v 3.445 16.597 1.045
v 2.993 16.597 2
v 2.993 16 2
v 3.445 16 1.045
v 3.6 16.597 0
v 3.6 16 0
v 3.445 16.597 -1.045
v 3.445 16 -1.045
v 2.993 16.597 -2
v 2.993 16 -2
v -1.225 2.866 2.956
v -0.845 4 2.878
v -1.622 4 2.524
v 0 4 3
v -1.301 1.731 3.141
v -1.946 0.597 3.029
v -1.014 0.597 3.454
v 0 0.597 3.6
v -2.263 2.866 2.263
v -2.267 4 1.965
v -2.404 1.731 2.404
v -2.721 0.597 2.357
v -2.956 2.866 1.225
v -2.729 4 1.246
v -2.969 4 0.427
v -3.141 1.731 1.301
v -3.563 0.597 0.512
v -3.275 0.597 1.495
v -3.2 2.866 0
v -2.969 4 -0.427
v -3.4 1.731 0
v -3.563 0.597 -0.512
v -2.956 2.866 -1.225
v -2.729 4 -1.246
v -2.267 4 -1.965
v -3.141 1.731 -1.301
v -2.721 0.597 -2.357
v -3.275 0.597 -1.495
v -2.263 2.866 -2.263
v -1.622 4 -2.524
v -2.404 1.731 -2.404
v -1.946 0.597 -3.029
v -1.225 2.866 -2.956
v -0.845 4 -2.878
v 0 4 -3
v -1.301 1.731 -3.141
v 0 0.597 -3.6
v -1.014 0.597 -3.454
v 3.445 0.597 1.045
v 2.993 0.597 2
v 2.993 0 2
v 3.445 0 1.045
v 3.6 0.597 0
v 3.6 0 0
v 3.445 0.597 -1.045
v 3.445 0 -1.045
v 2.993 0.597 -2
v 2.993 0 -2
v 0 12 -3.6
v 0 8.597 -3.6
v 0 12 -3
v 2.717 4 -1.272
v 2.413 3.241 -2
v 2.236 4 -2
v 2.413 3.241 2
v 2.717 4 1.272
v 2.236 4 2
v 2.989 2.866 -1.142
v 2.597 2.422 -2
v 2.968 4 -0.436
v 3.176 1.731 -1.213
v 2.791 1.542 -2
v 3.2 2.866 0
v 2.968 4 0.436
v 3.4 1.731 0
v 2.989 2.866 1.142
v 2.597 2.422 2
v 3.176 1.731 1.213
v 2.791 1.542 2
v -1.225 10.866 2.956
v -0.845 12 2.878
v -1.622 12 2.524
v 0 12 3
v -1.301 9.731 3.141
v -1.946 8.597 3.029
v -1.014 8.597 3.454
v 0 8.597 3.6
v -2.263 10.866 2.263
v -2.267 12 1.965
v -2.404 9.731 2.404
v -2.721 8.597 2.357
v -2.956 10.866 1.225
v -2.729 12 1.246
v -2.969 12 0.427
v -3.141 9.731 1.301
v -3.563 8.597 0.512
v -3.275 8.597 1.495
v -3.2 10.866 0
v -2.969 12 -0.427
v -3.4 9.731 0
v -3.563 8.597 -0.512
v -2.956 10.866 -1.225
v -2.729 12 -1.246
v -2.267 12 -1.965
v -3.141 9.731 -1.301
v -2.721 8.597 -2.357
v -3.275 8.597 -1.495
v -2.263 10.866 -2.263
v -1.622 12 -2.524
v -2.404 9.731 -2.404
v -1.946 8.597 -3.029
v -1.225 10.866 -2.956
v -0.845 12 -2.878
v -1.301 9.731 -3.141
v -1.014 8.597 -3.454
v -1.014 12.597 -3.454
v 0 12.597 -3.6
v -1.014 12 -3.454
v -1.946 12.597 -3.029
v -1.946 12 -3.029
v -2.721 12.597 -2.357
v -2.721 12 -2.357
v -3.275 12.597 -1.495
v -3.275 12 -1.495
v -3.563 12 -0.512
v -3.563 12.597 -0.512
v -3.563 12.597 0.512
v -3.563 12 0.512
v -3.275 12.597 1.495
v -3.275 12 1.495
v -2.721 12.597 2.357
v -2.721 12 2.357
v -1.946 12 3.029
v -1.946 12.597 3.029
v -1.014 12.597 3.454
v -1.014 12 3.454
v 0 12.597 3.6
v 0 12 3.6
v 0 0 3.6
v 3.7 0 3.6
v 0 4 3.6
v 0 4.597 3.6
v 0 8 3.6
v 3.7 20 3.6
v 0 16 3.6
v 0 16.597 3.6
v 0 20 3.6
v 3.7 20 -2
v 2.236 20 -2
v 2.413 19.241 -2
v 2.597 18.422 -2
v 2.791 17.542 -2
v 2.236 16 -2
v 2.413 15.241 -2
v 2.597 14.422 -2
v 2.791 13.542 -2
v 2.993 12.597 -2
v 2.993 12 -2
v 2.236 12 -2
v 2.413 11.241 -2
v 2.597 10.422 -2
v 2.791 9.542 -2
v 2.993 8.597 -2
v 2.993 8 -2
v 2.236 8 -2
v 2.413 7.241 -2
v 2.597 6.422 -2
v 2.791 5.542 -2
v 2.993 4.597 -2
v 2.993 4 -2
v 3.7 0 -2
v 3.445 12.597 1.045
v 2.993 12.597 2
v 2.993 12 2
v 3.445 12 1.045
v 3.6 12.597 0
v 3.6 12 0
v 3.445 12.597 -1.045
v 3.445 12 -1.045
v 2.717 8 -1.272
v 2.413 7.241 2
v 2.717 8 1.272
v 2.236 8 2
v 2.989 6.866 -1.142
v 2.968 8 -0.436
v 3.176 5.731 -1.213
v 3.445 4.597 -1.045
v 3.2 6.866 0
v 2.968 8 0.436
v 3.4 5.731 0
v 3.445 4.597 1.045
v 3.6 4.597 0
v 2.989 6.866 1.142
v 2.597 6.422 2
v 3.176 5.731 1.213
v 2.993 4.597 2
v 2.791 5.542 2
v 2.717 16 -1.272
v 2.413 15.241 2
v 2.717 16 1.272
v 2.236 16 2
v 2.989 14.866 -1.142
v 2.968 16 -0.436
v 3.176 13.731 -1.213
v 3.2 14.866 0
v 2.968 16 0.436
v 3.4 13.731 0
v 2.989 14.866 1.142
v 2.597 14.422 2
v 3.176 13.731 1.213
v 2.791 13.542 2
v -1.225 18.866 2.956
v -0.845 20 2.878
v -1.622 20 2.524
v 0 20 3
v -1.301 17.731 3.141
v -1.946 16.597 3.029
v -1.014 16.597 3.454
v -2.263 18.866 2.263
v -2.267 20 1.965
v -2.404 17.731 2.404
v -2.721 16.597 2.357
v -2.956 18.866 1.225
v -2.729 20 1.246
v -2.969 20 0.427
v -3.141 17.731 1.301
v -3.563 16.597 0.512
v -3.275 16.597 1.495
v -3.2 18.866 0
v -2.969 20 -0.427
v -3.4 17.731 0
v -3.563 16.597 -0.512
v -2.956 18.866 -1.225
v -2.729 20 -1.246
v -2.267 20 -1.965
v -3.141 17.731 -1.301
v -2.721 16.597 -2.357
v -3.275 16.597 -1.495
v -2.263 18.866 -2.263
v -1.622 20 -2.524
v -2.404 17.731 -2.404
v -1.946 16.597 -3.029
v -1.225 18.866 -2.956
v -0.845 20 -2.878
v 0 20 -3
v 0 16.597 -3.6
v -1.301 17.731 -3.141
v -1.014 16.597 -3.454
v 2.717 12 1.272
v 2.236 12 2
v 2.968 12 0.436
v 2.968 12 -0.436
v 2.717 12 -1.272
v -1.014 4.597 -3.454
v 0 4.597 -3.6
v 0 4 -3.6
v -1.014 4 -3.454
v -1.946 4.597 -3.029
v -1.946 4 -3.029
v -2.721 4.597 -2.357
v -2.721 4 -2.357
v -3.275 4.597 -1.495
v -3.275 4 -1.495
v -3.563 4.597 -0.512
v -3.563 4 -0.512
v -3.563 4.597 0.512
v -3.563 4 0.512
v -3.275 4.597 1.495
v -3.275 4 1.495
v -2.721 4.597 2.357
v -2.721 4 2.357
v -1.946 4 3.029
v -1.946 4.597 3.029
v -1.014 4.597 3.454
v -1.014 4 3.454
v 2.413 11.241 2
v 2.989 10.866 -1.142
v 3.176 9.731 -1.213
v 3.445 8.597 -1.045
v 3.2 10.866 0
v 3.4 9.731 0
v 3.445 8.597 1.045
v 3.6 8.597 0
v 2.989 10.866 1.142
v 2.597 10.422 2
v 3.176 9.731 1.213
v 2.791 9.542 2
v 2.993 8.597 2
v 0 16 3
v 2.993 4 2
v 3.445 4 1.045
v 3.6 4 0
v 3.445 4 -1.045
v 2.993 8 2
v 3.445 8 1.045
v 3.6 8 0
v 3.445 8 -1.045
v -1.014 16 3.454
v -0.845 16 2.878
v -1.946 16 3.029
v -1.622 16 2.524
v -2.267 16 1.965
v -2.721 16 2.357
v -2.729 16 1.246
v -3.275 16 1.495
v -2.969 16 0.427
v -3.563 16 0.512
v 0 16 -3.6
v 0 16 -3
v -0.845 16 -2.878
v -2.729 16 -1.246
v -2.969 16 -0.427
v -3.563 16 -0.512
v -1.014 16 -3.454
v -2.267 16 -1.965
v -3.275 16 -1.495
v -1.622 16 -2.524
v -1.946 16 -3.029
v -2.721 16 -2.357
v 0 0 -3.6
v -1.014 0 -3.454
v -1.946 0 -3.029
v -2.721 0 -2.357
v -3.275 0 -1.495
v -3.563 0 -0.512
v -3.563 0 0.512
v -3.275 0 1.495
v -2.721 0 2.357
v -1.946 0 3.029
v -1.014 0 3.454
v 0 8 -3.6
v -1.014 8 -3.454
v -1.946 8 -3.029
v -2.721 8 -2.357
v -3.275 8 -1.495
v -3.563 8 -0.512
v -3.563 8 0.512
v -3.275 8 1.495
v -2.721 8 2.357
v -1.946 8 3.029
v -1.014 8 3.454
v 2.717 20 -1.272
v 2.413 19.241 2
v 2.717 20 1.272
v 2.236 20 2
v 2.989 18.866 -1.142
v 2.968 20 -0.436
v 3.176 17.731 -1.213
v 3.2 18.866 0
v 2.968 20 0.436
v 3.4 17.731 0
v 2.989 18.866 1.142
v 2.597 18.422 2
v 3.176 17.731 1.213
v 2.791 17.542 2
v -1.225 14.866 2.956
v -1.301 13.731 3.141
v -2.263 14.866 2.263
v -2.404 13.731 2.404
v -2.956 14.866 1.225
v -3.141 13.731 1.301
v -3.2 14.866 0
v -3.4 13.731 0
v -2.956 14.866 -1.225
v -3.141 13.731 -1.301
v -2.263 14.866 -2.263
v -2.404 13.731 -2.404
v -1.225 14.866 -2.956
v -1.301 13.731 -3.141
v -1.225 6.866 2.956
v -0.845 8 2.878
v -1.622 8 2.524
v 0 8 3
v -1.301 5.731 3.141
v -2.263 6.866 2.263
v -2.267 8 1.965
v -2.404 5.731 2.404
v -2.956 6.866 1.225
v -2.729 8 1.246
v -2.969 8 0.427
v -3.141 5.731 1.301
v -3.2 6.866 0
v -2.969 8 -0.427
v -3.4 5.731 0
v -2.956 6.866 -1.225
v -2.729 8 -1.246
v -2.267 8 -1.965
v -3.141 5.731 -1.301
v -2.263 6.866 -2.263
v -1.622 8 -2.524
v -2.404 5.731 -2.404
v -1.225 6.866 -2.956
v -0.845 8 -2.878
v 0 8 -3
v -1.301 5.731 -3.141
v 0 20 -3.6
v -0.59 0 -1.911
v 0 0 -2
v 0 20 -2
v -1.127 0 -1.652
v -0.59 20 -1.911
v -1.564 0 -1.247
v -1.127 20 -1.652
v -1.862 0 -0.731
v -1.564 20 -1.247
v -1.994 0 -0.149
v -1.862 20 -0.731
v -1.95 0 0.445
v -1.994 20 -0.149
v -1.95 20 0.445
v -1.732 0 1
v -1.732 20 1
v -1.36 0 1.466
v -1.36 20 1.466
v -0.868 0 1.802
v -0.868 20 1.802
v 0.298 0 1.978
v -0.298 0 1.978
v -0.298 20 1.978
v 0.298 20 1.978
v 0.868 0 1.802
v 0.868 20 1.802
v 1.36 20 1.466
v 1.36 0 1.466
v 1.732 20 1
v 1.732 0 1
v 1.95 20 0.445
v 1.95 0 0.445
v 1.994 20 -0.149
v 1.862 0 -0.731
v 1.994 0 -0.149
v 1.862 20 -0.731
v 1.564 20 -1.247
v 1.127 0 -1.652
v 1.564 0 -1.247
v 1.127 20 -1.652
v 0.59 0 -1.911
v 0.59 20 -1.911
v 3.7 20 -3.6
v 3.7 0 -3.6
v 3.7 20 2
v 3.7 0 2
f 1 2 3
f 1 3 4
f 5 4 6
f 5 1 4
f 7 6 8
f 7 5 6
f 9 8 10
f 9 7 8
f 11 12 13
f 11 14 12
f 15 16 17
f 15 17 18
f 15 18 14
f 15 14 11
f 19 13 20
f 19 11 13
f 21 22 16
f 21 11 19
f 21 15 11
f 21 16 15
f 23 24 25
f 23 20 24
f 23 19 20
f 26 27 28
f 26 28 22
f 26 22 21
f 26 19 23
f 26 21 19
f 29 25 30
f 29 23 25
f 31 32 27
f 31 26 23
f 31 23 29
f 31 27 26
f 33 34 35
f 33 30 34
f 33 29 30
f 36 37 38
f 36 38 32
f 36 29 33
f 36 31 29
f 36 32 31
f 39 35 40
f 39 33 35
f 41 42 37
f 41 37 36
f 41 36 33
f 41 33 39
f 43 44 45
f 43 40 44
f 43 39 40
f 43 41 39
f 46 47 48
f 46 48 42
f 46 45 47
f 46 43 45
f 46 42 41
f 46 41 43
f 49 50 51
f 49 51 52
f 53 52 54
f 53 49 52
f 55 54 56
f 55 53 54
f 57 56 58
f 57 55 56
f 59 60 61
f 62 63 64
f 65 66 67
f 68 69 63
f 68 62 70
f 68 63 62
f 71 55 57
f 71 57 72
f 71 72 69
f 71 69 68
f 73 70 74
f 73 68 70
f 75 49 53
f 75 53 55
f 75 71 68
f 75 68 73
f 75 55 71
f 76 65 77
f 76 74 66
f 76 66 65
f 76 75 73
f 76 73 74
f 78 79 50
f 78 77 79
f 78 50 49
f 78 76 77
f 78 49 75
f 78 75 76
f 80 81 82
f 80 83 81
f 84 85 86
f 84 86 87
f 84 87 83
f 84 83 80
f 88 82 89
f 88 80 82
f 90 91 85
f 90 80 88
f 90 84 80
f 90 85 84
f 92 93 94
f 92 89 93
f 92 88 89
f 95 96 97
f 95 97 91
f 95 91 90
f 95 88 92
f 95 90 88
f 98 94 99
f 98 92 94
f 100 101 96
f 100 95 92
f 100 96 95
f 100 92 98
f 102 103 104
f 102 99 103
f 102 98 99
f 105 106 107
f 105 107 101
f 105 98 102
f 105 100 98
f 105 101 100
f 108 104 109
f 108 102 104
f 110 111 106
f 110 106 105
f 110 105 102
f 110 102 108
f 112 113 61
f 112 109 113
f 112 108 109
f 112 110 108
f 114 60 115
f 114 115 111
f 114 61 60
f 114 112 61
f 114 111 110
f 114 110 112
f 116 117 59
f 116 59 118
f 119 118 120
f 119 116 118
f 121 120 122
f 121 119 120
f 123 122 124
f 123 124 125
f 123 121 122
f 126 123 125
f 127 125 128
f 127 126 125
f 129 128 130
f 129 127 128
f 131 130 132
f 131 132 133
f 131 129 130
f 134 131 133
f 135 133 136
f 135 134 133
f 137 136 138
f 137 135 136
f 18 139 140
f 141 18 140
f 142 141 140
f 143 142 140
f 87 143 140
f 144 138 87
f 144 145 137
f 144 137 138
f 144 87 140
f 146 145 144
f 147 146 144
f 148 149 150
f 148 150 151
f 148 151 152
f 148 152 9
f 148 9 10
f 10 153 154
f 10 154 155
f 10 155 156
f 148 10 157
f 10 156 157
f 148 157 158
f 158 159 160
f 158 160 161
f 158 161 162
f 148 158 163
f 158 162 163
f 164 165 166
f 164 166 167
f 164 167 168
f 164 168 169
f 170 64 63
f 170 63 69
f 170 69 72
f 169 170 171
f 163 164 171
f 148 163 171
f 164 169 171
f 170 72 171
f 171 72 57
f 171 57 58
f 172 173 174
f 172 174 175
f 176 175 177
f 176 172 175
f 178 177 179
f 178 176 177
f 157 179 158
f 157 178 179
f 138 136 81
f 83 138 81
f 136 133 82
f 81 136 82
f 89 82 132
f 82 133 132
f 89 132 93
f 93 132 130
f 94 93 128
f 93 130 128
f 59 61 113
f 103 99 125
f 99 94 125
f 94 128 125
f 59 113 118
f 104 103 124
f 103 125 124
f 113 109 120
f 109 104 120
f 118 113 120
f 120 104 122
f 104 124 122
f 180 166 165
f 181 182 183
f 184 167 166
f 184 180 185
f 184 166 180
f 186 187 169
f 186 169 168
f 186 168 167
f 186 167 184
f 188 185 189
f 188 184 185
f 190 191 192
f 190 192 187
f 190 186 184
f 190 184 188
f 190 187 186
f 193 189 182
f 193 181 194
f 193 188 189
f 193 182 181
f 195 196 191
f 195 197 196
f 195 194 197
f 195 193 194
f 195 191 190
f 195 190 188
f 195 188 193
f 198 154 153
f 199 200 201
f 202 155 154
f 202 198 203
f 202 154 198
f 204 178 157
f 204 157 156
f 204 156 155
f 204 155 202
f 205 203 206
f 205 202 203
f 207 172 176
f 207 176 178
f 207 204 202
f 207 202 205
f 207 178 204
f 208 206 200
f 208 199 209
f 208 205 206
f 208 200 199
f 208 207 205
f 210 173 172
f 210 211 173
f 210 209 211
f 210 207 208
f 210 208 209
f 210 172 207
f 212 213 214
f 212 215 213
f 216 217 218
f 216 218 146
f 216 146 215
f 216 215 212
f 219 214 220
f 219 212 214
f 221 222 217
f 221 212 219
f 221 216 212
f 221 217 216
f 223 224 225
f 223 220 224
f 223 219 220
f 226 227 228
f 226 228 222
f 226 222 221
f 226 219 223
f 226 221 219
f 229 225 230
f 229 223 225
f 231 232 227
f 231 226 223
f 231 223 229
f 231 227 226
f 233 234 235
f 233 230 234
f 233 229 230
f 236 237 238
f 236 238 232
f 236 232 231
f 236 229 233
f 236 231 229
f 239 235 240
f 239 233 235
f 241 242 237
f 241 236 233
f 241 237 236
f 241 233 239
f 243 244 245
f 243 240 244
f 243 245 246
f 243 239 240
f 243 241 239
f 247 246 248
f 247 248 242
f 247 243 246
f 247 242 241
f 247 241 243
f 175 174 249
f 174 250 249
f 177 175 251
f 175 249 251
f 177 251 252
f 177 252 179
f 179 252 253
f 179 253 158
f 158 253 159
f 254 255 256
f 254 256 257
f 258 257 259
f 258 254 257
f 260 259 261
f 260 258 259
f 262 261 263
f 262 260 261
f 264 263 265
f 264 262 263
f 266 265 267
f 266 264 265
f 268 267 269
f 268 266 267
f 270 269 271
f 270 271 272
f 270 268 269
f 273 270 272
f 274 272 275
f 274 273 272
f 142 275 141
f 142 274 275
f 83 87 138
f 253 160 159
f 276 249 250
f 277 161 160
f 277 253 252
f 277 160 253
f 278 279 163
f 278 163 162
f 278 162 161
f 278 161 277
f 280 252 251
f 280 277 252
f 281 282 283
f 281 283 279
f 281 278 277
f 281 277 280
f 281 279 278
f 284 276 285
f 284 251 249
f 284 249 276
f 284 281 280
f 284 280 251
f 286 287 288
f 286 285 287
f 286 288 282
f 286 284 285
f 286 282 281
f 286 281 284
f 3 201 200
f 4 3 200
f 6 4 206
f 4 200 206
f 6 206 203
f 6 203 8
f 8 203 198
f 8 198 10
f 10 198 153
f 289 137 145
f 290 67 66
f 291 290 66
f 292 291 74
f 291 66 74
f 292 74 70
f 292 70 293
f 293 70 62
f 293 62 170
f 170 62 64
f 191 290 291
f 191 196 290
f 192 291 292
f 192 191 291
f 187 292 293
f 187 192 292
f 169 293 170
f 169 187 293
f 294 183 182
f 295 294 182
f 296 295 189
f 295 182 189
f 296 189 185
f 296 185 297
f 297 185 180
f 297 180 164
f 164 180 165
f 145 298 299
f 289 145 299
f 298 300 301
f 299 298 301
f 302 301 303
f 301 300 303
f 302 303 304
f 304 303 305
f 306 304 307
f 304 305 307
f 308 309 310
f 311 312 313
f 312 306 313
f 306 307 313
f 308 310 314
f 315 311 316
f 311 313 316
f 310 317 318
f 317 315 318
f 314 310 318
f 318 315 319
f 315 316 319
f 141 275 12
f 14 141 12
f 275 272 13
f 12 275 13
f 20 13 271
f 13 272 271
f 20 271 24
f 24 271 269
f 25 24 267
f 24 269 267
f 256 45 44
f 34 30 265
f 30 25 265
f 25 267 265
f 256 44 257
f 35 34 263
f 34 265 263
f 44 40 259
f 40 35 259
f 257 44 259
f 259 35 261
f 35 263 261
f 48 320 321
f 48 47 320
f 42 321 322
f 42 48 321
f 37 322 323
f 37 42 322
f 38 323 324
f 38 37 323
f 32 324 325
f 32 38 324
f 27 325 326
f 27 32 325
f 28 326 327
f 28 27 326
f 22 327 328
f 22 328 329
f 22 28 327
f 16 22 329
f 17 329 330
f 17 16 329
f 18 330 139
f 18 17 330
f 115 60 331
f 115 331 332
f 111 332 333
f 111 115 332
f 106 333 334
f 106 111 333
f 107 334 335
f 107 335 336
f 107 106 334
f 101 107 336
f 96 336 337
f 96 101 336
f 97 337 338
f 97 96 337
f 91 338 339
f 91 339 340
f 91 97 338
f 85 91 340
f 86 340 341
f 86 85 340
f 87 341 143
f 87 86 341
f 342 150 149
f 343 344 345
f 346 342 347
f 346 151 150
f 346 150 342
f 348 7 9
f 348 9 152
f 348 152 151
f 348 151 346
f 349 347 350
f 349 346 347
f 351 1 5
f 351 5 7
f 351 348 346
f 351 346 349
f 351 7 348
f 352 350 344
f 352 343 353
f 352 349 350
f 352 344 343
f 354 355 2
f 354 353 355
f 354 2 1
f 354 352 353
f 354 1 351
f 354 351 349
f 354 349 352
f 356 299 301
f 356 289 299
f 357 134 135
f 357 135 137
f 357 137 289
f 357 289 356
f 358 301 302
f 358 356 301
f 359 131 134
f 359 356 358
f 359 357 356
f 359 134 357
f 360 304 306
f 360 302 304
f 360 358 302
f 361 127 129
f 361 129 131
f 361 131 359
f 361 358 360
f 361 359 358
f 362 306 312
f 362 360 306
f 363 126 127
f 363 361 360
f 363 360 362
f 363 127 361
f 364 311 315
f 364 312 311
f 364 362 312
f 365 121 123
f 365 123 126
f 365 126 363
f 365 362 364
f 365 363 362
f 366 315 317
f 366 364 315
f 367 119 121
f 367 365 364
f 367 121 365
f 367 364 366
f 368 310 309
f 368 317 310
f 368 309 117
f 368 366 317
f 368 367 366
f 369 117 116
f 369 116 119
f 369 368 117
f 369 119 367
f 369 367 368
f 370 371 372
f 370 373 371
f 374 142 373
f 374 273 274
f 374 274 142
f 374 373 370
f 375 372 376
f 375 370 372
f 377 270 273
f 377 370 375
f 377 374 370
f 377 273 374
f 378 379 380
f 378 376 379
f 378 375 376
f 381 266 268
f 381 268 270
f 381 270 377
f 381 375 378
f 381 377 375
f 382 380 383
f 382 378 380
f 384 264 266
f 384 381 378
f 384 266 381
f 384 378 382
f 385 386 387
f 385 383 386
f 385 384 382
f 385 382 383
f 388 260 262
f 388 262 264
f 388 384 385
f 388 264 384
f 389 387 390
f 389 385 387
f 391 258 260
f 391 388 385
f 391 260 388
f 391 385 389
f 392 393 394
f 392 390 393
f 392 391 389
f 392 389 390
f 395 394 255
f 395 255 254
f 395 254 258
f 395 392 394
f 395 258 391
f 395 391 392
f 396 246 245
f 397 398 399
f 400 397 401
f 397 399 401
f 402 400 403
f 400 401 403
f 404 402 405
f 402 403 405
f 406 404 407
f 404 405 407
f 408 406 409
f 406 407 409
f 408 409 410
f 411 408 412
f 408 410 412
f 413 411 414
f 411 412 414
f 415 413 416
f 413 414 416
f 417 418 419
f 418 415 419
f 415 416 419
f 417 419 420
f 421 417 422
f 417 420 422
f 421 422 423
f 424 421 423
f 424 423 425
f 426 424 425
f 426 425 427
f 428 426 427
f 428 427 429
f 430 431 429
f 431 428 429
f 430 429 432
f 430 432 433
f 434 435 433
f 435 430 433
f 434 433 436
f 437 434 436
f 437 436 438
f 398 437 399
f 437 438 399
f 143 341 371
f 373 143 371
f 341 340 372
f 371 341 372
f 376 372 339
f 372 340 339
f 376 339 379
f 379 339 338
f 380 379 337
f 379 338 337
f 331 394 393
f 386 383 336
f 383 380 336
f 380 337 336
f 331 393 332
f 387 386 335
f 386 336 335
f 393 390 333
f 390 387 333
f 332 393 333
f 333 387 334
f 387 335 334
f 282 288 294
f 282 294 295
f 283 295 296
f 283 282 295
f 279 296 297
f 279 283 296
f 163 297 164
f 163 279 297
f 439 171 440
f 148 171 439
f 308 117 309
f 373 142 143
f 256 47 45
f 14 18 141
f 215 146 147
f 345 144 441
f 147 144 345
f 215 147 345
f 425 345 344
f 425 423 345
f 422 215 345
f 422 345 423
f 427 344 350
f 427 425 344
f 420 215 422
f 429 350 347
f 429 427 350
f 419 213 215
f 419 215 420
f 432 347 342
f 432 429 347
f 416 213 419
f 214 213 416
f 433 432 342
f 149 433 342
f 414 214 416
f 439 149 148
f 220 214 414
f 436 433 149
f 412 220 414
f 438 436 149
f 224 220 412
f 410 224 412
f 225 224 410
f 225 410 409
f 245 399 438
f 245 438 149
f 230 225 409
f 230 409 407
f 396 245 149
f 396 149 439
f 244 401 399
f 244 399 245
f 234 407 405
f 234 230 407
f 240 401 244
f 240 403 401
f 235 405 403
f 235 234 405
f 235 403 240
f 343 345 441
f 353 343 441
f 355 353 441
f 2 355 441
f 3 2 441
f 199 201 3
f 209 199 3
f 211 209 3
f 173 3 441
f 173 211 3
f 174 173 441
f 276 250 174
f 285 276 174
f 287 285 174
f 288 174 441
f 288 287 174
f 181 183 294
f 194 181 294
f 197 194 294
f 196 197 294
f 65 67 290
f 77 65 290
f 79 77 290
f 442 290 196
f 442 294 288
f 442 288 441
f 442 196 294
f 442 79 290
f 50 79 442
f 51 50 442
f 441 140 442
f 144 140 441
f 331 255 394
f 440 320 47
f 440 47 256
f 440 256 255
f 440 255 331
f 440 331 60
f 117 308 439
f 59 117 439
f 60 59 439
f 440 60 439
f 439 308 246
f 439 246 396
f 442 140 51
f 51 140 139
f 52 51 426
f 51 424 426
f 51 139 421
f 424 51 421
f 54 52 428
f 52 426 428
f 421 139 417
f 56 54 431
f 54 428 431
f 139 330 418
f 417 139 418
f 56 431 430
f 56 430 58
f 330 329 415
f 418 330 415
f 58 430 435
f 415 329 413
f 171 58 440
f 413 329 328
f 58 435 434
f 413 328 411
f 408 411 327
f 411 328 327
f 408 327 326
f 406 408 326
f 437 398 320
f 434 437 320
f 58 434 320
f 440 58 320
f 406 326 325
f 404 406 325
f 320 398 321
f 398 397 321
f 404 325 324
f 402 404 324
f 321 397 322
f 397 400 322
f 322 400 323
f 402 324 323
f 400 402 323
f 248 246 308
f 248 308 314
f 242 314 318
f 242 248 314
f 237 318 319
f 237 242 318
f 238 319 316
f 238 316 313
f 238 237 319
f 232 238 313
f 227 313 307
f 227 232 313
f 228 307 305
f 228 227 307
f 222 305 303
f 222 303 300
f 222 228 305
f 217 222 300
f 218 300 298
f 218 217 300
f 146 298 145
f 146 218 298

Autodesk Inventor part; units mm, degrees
ref_plane "YZ Plane" through (0, 0, 0) normal (1, 0, 0) x (0, 1, 0)
ref_plane "XZ Plane" through (0, 0, 0) normal (0, 1, 0) x (-1, 0, 0)
ref_plane "XY Plane" through (0, 0, 0) normal (0, 0, 1) x (1, 0, 0)
sketch "Sketch1" plane through (0, 0, 0) normal (1, 0, 0) x (0, 1, 0)
  line L0 (0, -2) -> (4, -2)
  line L1 (4, -2) -> (4, -3)
  line L2 (4, -3) -> (0.5972, -3.6)
  line L3 (0, -3.6) -> (0, -2)
  line L4 (-4, 0) -> (24, 0) projected
  line L5 (0, -3.6) -> (0.5972, -3.6)
  line L6 (4, -2) -> (8, -2)
  line L7 (8, -2) -> (8, -3)
  line L8 (8, -3) -> (4.5972, -3.6)
  line L9 (4, -3.6) -> (4, -2)
  line L10 (4, -3.6) -> (4.5972, -3.6)
  line L11 (8, -2) -> (12, -2)
  line L12 (12, -2) -> (12, -3)
  line L13 (12, -3) -> (8.5972, -3.6)
  line L14 (8, -3.6) -> (8, -2)
  line L15 (8, -3.6) -> (8.5972, -3.6)
  line L16 (12, -2) -> (16, -2)
  line L17 (16, -2) -> (16, -3)
  line L18 (16, -3) -> (12.5972, -3.6)
  line L19 (12, -3.6) -> (12, -2)
  line L20 (12, -3.6) -> (12.5972, -3.6)
  line L21 (16, -2) -> (20, -2)
  line L22 (20, -2) -> (20, -3)
  line L23 (20, -3) -> (16.5972, -3.6)
  line L24 (16, -3.6) -> (16, -2)
  line L25 (16, -3.6) -> (16.5972, -3.6)
  point P0 (0, 0)
  dimension "d0" = 1
  dimension "d1" = 2
  dimension "d2" = 4
  dimension "d3" = 10
  dimension "d4" = 0
  dimension "d12" = 3.6
  dimension "d15" = 4
revolve "Revolution1" add sketch "Sketch1" angle 360 about axis through (0, -10, 0) along (0, 1, 0)
sketch "Sketch2" plane through (0, 0, 0) normal (1, 0, 0) x (0, 1, 0)
  line L0 (0, -3.6) -> (0, 3.6) projected
  line L1 (20, -2) -> (20, 2) projected
  line L2 (0, -3.6) -> (20, -3.6)
  line L3 (20, -3.6) -> (20, -2)
  line L4 (20, -2) -> (0, -2)
  line L5 (0, -2) -> (0, -3.6)
  line L6 (0, 3.6) -> (20, 3.6)
  line L7 (20, 3.6) -> (20, 2)
  line L8 (20, 2) -> (0, 2)
  line L9 (0, 2) -> (0, 3.6)
  point P0 (0, 0)
  point P1 (0, 1.6227)
  point P2 (20, -3.8756)
  dimension "d24" = 1.6
extrude "Extrusion1" add sketch "Sketch2" along normal blind 3.7 contours L0 L4 L3 L2 | L0 L6 L7 L8
properties part number "nipple"
